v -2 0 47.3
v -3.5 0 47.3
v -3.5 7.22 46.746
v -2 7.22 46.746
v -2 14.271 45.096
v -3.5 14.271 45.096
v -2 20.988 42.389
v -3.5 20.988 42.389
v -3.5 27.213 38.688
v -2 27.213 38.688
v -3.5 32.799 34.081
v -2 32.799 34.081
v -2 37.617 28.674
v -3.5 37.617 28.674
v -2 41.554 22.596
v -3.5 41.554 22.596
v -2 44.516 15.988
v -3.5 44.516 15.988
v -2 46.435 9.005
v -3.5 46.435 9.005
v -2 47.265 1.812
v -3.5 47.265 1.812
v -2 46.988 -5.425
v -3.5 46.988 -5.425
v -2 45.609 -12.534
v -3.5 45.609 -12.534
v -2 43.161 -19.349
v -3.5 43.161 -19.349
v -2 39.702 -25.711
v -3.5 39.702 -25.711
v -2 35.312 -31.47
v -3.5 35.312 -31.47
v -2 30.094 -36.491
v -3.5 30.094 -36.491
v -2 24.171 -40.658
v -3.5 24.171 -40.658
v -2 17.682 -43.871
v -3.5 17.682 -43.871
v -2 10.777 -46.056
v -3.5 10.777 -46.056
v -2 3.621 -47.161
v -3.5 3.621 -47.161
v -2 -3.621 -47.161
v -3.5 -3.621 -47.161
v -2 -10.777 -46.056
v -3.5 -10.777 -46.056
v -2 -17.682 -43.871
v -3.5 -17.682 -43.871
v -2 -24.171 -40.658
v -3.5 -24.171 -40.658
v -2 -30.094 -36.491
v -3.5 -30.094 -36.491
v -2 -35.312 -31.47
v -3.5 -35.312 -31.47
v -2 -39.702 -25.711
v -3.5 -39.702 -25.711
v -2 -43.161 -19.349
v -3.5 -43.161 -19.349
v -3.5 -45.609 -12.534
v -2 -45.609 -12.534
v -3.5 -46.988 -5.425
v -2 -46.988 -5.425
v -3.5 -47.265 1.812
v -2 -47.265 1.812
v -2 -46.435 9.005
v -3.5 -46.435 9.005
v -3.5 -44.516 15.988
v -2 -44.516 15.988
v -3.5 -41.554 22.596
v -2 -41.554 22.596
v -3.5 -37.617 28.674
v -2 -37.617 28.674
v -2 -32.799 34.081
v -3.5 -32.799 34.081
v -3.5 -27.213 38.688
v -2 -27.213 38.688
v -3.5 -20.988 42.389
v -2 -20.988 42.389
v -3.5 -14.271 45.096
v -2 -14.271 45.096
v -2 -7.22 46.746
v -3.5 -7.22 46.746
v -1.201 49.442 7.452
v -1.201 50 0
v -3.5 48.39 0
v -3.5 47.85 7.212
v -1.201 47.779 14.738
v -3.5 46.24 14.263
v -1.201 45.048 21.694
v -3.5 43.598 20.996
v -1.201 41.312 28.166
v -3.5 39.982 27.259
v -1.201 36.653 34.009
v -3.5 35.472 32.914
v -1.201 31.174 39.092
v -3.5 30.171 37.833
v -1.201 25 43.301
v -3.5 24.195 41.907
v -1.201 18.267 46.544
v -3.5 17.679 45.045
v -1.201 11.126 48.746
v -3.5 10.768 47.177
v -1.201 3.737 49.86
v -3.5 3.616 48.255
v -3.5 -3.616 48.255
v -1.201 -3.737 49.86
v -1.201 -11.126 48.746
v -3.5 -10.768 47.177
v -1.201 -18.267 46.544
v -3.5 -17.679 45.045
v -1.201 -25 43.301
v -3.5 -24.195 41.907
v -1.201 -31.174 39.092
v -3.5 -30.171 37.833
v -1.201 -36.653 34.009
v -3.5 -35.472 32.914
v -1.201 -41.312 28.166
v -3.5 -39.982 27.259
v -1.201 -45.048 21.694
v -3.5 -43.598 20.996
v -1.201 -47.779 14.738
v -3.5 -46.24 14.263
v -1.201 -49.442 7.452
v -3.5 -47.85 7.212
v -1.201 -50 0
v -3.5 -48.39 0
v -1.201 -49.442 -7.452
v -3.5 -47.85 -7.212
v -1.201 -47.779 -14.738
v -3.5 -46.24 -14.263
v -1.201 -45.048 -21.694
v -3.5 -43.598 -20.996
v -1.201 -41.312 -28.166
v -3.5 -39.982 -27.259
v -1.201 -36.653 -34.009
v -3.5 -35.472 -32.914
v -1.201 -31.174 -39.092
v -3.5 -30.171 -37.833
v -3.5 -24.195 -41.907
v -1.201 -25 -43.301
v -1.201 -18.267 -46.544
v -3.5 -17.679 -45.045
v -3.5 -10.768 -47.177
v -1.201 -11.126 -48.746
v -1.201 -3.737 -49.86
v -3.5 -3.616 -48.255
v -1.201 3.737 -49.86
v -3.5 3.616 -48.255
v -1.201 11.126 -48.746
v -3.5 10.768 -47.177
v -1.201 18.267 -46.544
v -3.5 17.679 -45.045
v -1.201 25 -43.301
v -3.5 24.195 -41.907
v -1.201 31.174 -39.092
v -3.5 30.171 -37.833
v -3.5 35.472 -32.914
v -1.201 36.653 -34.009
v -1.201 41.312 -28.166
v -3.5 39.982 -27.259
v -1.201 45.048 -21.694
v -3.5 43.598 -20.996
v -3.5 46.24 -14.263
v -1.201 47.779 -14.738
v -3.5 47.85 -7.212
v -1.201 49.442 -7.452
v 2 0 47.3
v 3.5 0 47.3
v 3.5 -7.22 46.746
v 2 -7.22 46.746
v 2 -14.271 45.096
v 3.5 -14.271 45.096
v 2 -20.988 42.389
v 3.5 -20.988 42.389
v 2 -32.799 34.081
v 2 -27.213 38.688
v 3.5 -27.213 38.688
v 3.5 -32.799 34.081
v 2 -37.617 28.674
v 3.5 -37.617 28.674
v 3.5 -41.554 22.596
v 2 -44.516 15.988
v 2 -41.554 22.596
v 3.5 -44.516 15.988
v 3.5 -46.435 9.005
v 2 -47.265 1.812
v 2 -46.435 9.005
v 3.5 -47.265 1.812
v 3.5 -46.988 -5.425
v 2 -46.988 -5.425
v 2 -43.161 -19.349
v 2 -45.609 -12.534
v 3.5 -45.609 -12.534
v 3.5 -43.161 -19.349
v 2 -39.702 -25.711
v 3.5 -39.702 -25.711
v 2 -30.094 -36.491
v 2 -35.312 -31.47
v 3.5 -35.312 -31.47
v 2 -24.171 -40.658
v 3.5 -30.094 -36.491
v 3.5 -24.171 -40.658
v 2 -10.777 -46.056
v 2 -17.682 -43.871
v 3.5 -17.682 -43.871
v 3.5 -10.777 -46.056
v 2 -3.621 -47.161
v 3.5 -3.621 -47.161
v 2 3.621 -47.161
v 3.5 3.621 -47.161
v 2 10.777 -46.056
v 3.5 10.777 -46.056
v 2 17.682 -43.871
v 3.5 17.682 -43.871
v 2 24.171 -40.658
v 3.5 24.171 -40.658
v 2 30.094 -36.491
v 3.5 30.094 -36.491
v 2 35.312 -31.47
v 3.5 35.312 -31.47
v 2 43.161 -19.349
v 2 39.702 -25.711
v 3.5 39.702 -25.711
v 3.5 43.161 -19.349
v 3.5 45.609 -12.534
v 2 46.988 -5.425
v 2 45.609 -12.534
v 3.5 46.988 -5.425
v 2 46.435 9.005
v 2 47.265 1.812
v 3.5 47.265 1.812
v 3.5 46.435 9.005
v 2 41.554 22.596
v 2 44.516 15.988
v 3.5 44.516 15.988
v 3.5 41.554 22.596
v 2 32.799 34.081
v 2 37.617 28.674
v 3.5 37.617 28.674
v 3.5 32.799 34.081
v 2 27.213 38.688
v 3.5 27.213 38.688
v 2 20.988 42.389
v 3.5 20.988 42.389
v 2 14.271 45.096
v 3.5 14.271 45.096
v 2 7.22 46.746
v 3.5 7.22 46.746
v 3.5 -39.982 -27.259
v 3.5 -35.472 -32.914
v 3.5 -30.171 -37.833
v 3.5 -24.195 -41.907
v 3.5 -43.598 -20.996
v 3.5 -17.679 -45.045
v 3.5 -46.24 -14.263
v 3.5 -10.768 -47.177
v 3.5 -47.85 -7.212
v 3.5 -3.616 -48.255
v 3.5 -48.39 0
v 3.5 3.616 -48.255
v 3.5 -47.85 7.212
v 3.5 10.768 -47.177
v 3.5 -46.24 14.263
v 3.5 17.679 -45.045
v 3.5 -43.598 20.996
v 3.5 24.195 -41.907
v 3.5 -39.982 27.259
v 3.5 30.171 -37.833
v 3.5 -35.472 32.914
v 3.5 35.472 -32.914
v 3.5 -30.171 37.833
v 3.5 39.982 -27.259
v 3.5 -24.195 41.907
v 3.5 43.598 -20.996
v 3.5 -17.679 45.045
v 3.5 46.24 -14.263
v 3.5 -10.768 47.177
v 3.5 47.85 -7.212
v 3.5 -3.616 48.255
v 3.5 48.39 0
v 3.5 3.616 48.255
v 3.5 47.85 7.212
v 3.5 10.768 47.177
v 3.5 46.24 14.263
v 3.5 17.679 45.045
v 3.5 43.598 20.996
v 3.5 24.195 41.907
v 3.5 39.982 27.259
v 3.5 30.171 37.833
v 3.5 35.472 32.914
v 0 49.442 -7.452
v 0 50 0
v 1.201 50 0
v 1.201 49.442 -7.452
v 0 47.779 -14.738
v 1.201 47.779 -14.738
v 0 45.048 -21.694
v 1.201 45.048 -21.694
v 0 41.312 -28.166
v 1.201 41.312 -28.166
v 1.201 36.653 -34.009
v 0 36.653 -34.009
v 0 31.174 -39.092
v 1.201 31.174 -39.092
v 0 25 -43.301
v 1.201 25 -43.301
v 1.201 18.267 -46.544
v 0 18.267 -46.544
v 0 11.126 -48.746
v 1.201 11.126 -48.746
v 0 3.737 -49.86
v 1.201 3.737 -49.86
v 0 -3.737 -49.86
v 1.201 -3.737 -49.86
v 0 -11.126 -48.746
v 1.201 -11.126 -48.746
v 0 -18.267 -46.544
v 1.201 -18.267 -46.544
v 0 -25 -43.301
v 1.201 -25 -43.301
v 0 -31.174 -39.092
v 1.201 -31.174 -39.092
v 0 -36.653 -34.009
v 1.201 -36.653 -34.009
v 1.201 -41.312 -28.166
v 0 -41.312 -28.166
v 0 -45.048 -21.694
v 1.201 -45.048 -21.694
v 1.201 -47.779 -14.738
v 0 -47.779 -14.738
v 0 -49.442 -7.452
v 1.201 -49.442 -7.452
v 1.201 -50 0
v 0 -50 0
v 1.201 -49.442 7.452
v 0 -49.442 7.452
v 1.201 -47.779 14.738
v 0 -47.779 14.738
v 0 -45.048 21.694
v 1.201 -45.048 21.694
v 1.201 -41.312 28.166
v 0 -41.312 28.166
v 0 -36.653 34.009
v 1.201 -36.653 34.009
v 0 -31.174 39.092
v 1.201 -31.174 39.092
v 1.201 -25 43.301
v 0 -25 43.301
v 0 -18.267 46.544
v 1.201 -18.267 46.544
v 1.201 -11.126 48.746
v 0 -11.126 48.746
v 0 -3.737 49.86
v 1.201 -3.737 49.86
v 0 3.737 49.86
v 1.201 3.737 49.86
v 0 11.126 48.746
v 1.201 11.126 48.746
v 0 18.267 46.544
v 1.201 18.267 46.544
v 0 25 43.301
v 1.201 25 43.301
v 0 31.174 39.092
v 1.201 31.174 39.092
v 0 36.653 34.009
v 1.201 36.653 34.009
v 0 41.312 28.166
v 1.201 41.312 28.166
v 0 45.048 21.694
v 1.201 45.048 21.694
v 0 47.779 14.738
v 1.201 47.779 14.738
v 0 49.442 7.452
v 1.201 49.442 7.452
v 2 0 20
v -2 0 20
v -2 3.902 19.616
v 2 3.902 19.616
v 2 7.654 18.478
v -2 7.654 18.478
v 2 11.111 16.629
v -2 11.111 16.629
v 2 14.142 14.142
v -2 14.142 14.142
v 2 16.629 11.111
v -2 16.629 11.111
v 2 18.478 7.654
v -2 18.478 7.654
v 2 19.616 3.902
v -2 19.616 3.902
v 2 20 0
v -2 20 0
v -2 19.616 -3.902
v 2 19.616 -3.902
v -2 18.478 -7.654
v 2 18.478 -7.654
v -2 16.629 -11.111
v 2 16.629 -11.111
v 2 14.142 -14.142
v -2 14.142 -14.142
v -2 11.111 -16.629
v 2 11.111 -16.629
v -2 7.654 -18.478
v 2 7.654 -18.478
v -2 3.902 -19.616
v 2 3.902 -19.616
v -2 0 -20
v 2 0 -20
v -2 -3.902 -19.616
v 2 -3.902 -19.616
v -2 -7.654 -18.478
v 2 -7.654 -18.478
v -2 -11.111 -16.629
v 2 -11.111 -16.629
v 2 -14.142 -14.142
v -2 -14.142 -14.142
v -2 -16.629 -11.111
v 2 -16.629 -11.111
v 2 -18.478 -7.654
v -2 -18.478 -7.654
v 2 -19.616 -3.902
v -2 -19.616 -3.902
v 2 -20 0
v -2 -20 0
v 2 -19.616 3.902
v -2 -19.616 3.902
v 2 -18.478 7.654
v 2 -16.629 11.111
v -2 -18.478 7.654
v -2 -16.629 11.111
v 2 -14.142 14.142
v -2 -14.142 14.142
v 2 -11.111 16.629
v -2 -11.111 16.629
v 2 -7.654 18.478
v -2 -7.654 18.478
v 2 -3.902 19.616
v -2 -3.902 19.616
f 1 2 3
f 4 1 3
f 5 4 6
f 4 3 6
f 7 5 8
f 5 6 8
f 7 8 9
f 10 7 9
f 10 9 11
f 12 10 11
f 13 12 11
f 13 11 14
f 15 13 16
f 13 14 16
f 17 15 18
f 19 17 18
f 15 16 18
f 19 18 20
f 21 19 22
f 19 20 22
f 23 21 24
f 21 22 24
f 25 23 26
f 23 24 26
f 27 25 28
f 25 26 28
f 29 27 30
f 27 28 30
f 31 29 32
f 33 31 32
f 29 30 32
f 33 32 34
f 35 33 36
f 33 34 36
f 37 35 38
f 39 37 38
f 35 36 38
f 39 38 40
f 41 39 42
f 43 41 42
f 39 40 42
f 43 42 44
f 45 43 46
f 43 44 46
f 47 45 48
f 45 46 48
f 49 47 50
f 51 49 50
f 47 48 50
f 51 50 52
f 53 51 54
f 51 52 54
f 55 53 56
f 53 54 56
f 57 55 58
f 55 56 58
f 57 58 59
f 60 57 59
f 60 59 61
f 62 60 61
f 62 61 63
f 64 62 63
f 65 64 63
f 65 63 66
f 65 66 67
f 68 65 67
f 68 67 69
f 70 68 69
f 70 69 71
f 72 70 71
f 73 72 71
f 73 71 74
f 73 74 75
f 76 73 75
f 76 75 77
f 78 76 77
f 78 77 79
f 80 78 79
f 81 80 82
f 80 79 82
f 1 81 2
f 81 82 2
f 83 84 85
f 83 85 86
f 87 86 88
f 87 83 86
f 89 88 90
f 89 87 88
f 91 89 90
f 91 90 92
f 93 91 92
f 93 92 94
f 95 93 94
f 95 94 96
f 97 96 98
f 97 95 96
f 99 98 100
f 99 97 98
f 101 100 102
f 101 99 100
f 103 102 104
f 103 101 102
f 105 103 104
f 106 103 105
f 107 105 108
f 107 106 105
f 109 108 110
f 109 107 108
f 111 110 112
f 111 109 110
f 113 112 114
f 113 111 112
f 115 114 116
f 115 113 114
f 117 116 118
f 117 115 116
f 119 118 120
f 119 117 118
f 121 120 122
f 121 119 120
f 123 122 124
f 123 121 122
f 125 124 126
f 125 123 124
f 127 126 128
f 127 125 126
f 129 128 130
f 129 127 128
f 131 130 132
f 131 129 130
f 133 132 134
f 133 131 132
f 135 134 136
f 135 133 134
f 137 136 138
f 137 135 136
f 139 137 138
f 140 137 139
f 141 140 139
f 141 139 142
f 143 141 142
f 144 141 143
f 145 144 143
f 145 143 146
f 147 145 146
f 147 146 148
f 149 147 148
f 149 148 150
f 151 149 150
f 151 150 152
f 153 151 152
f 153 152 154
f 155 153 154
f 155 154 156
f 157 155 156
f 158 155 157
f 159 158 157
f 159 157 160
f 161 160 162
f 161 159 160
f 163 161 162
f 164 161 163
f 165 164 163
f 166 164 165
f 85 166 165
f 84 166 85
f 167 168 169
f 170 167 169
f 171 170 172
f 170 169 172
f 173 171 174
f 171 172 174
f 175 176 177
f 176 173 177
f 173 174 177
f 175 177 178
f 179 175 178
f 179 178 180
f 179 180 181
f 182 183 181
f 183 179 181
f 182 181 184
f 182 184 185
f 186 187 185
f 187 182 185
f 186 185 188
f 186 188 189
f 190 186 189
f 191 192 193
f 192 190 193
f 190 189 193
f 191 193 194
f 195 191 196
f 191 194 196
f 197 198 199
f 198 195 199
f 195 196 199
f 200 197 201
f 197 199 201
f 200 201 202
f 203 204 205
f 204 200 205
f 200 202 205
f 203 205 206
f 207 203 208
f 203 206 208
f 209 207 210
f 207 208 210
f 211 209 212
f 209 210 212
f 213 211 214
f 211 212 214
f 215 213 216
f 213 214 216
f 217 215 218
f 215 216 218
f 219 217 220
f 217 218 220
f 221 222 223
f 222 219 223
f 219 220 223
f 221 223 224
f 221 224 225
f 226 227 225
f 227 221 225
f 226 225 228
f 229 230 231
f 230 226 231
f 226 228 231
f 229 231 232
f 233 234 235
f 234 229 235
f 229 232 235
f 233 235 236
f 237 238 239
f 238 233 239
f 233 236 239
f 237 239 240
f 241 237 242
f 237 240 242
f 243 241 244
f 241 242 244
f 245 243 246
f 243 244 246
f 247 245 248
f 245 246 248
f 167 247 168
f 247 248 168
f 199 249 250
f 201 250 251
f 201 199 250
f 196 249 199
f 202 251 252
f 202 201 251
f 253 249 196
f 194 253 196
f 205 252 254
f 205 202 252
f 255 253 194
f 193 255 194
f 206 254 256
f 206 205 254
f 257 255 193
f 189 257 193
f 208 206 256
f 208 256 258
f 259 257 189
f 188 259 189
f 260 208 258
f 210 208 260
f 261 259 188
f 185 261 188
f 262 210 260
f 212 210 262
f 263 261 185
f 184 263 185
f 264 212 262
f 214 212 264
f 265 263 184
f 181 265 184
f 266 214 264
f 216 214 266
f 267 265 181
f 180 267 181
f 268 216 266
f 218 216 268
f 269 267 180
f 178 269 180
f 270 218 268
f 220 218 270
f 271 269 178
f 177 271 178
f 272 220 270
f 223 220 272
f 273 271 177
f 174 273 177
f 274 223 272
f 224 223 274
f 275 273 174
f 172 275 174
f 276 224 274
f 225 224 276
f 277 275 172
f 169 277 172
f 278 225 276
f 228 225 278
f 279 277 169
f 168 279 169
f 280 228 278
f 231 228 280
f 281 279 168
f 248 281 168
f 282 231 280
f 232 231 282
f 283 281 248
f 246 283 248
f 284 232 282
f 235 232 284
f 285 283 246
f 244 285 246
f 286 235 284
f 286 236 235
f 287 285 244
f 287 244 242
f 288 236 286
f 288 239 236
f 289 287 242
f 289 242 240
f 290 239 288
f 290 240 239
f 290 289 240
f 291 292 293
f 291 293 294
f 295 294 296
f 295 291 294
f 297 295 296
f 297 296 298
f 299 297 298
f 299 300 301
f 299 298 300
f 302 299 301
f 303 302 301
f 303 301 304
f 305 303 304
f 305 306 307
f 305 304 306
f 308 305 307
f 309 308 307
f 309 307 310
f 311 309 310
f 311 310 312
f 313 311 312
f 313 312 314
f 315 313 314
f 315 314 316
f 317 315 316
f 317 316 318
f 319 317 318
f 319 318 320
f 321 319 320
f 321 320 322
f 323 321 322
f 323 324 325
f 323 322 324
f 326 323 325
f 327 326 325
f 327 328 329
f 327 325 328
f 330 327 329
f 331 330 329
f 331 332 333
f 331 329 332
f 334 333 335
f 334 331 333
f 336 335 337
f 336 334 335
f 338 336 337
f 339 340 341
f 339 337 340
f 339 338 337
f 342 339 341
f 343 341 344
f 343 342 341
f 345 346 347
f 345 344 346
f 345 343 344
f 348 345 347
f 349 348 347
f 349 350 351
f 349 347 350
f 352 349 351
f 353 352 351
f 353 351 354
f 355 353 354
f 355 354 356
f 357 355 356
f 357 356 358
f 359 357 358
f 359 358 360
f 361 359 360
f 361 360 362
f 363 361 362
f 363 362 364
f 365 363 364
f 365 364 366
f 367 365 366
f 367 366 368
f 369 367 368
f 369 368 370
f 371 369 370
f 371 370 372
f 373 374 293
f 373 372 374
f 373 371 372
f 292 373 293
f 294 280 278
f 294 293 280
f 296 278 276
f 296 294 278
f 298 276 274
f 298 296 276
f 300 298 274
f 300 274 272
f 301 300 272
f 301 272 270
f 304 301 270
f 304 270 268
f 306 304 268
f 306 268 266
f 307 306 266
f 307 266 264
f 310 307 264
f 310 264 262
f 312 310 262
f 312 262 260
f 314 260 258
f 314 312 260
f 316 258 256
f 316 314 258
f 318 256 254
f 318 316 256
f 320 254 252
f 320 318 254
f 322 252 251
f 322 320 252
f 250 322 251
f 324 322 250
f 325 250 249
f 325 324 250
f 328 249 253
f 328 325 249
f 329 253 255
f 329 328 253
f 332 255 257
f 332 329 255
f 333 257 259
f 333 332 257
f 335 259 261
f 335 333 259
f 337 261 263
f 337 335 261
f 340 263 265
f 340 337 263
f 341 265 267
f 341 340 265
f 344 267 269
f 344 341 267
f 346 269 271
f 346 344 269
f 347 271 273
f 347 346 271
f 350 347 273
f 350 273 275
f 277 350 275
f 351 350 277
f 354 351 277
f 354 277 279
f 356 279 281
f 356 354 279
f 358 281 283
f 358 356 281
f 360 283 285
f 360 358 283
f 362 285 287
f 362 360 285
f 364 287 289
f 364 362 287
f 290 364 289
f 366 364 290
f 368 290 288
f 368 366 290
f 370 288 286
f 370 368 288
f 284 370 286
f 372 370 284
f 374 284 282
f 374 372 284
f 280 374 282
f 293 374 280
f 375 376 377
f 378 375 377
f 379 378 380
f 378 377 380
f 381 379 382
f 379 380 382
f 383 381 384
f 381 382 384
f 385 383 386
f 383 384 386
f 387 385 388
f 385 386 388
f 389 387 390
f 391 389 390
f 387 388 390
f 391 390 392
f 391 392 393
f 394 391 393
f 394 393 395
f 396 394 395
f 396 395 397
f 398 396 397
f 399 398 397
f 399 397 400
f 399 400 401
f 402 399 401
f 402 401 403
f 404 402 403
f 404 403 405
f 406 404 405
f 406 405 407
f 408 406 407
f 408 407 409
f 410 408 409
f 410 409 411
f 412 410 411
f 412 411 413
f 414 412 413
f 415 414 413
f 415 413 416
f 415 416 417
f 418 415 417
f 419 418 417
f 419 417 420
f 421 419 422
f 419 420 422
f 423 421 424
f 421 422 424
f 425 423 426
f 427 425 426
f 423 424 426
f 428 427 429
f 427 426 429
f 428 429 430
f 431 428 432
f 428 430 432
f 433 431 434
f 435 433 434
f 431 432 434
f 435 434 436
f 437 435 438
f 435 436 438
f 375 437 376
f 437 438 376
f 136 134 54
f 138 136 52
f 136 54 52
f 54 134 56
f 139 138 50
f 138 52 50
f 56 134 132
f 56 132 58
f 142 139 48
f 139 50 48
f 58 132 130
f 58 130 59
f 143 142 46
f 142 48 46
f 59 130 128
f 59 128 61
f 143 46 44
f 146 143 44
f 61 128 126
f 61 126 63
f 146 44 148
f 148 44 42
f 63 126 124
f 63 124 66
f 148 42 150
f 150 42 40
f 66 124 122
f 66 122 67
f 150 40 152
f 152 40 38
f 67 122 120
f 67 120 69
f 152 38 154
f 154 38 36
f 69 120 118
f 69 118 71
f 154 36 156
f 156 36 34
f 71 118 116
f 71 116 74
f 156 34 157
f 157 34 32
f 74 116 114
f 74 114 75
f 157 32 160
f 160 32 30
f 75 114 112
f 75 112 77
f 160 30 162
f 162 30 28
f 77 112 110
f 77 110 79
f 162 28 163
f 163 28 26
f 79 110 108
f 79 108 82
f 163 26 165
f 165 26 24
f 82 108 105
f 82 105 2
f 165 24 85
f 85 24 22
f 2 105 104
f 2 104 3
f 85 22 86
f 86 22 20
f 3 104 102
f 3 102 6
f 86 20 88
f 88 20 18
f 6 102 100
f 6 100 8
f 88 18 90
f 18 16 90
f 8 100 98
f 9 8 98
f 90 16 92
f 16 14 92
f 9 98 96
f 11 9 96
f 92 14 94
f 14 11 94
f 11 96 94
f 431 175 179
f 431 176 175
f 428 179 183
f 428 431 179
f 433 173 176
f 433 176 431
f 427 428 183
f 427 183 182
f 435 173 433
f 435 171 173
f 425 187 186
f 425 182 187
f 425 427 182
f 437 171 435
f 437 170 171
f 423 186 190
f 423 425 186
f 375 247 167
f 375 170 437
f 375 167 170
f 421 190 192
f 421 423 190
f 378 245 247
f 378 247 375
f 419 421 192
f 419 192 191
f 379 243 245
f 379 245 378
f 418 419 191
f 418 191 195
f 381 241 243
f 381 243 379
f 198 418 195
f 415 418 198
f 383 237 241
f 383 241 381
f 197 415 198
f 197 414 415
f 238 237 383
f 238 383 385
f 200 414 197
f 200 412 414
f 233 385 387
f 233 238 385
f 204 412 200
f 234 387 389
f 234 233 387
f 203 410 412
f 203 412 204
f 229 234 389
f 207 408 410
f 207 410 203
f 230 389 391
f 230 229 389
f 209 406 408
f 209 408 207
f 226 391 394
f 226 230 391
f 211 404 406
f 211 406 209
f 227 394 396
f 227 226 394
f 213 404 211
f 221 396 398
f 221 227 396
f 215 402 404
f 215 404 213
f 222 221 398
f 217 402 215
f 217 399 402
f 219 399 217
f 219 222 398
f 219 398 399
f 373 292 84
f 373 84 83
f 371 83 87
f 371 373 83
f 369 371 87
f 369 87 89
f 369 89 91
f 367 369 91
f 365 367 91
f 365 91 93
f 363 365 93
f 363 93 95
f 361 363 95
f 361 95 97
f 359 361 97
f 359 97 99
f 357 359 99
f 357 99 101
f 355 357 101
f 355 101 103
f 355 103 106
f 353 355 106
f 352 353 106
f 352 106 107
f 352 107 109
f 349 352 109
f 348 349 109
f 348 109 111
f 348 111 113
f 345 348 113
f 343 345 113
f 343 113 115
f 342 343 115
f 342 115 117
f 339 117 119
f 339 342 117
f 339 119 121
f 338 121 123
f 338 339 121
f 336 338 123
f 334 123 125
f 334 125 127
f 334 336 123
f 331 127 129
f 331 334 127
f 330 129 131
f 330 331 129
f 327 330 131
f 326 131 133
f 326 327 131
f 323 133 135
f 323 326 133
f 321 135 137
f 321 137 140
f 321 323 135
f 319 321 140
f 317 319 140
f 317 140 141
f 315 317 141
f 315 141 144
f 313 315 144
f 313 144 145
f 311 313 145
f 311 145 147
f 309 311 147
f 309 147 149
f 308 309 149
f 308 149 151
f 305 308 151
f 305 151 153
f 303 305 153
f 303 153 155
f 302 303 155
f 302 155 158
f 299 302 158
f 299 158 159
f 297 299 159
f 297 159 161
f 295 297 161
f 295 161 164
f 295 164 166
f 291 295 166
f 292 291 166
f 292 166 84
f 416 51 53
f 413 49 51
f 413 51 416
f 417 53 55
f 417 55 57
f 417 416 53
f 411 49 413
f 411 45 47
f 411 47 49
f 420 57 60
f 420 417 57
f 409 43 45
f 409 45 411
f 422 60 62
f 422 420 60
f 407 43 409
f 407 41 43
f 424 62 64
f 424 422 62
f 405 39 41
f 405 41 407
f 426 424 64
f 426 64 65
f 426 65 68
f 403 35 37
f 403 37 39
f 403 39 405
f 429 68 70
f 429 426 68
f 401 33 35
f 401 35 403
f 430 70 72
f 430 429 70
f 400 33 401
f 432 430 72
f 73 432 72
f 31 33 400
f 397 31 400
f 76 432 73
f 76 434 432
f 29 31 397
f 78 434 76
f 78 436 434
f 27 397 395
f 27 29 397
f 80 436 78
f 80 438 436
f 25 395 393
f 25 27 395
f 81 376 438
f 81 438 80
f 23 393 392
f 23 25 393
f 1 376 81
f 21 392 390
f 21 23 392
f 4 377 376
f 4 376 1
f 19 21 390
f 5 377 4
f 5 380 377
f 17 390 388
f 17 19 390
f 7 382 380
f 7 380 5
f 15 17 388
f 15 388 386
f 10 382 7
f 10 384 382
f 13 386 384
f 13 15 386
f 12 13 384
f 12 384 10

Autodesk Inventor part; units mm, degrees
ref_plane "YZ Plane" through (0, 0, 0) normal (1, 0, 0) x (0, 1, 0)
ref_plane "XZ Plane" through (0, 0, 0) normal (0, 1, 0) x (-1, 0, 0)
ref_plane "XY Plane" through (0, 0, 0) normal (0, 0, 1) x (1, 0, 0)
sketch "Sketch1" plane through (0, 0, 0) normal (1, 0, 0) x (0, 1, 0)
  circle A0 centre (0, 0) radius 50
  dimension "d0" = 100
extrude "Extrusion1" add sketch "Sketch1" along normal mid plane 7
sketch "Sketch2" plane through (-3.5, 0, 0) normal (-1, 0, 0) x (0, 0, 1)
  circle A0 centre (0, 0) radius 50 projected
  circle A1 centre (0, 0) radius 47.3
  dimension "d4" = 47.3
extrude "Extrusion2" cut sketch "Sketch2" against normal blind 1.5 contours A1
mirror "Mirror1" about plane through (0, 0, 0) normal (1, 0, 0) of "Extrusion2"
chamfer "Chamfer1" distance 1.61 angle 55 1 edges at (3.5, -50, 0) measured on face at (3.5, 0, -48.0382)
sketch "Sketch3" plane through (-2, 0, 0) normal (-1, 0, 0) x (0, 0, 1)
  circle A0 centre (0, 0) radius 20
  dimension "d10" = 40
extrude "Extrusion3" cut sketch "Sketch3" against normal through all
chamfer "Chamfer2" distance 1.61 angle 55 1 edges at (-3.5, -50, 0) measured on face at (-3.5, 0, -48.0382)
equation "\"d13\" = d7"
equation "\"d7\" = 1.61"
properties part number "Clamex grooving Tool" material "Stainless Steel"
